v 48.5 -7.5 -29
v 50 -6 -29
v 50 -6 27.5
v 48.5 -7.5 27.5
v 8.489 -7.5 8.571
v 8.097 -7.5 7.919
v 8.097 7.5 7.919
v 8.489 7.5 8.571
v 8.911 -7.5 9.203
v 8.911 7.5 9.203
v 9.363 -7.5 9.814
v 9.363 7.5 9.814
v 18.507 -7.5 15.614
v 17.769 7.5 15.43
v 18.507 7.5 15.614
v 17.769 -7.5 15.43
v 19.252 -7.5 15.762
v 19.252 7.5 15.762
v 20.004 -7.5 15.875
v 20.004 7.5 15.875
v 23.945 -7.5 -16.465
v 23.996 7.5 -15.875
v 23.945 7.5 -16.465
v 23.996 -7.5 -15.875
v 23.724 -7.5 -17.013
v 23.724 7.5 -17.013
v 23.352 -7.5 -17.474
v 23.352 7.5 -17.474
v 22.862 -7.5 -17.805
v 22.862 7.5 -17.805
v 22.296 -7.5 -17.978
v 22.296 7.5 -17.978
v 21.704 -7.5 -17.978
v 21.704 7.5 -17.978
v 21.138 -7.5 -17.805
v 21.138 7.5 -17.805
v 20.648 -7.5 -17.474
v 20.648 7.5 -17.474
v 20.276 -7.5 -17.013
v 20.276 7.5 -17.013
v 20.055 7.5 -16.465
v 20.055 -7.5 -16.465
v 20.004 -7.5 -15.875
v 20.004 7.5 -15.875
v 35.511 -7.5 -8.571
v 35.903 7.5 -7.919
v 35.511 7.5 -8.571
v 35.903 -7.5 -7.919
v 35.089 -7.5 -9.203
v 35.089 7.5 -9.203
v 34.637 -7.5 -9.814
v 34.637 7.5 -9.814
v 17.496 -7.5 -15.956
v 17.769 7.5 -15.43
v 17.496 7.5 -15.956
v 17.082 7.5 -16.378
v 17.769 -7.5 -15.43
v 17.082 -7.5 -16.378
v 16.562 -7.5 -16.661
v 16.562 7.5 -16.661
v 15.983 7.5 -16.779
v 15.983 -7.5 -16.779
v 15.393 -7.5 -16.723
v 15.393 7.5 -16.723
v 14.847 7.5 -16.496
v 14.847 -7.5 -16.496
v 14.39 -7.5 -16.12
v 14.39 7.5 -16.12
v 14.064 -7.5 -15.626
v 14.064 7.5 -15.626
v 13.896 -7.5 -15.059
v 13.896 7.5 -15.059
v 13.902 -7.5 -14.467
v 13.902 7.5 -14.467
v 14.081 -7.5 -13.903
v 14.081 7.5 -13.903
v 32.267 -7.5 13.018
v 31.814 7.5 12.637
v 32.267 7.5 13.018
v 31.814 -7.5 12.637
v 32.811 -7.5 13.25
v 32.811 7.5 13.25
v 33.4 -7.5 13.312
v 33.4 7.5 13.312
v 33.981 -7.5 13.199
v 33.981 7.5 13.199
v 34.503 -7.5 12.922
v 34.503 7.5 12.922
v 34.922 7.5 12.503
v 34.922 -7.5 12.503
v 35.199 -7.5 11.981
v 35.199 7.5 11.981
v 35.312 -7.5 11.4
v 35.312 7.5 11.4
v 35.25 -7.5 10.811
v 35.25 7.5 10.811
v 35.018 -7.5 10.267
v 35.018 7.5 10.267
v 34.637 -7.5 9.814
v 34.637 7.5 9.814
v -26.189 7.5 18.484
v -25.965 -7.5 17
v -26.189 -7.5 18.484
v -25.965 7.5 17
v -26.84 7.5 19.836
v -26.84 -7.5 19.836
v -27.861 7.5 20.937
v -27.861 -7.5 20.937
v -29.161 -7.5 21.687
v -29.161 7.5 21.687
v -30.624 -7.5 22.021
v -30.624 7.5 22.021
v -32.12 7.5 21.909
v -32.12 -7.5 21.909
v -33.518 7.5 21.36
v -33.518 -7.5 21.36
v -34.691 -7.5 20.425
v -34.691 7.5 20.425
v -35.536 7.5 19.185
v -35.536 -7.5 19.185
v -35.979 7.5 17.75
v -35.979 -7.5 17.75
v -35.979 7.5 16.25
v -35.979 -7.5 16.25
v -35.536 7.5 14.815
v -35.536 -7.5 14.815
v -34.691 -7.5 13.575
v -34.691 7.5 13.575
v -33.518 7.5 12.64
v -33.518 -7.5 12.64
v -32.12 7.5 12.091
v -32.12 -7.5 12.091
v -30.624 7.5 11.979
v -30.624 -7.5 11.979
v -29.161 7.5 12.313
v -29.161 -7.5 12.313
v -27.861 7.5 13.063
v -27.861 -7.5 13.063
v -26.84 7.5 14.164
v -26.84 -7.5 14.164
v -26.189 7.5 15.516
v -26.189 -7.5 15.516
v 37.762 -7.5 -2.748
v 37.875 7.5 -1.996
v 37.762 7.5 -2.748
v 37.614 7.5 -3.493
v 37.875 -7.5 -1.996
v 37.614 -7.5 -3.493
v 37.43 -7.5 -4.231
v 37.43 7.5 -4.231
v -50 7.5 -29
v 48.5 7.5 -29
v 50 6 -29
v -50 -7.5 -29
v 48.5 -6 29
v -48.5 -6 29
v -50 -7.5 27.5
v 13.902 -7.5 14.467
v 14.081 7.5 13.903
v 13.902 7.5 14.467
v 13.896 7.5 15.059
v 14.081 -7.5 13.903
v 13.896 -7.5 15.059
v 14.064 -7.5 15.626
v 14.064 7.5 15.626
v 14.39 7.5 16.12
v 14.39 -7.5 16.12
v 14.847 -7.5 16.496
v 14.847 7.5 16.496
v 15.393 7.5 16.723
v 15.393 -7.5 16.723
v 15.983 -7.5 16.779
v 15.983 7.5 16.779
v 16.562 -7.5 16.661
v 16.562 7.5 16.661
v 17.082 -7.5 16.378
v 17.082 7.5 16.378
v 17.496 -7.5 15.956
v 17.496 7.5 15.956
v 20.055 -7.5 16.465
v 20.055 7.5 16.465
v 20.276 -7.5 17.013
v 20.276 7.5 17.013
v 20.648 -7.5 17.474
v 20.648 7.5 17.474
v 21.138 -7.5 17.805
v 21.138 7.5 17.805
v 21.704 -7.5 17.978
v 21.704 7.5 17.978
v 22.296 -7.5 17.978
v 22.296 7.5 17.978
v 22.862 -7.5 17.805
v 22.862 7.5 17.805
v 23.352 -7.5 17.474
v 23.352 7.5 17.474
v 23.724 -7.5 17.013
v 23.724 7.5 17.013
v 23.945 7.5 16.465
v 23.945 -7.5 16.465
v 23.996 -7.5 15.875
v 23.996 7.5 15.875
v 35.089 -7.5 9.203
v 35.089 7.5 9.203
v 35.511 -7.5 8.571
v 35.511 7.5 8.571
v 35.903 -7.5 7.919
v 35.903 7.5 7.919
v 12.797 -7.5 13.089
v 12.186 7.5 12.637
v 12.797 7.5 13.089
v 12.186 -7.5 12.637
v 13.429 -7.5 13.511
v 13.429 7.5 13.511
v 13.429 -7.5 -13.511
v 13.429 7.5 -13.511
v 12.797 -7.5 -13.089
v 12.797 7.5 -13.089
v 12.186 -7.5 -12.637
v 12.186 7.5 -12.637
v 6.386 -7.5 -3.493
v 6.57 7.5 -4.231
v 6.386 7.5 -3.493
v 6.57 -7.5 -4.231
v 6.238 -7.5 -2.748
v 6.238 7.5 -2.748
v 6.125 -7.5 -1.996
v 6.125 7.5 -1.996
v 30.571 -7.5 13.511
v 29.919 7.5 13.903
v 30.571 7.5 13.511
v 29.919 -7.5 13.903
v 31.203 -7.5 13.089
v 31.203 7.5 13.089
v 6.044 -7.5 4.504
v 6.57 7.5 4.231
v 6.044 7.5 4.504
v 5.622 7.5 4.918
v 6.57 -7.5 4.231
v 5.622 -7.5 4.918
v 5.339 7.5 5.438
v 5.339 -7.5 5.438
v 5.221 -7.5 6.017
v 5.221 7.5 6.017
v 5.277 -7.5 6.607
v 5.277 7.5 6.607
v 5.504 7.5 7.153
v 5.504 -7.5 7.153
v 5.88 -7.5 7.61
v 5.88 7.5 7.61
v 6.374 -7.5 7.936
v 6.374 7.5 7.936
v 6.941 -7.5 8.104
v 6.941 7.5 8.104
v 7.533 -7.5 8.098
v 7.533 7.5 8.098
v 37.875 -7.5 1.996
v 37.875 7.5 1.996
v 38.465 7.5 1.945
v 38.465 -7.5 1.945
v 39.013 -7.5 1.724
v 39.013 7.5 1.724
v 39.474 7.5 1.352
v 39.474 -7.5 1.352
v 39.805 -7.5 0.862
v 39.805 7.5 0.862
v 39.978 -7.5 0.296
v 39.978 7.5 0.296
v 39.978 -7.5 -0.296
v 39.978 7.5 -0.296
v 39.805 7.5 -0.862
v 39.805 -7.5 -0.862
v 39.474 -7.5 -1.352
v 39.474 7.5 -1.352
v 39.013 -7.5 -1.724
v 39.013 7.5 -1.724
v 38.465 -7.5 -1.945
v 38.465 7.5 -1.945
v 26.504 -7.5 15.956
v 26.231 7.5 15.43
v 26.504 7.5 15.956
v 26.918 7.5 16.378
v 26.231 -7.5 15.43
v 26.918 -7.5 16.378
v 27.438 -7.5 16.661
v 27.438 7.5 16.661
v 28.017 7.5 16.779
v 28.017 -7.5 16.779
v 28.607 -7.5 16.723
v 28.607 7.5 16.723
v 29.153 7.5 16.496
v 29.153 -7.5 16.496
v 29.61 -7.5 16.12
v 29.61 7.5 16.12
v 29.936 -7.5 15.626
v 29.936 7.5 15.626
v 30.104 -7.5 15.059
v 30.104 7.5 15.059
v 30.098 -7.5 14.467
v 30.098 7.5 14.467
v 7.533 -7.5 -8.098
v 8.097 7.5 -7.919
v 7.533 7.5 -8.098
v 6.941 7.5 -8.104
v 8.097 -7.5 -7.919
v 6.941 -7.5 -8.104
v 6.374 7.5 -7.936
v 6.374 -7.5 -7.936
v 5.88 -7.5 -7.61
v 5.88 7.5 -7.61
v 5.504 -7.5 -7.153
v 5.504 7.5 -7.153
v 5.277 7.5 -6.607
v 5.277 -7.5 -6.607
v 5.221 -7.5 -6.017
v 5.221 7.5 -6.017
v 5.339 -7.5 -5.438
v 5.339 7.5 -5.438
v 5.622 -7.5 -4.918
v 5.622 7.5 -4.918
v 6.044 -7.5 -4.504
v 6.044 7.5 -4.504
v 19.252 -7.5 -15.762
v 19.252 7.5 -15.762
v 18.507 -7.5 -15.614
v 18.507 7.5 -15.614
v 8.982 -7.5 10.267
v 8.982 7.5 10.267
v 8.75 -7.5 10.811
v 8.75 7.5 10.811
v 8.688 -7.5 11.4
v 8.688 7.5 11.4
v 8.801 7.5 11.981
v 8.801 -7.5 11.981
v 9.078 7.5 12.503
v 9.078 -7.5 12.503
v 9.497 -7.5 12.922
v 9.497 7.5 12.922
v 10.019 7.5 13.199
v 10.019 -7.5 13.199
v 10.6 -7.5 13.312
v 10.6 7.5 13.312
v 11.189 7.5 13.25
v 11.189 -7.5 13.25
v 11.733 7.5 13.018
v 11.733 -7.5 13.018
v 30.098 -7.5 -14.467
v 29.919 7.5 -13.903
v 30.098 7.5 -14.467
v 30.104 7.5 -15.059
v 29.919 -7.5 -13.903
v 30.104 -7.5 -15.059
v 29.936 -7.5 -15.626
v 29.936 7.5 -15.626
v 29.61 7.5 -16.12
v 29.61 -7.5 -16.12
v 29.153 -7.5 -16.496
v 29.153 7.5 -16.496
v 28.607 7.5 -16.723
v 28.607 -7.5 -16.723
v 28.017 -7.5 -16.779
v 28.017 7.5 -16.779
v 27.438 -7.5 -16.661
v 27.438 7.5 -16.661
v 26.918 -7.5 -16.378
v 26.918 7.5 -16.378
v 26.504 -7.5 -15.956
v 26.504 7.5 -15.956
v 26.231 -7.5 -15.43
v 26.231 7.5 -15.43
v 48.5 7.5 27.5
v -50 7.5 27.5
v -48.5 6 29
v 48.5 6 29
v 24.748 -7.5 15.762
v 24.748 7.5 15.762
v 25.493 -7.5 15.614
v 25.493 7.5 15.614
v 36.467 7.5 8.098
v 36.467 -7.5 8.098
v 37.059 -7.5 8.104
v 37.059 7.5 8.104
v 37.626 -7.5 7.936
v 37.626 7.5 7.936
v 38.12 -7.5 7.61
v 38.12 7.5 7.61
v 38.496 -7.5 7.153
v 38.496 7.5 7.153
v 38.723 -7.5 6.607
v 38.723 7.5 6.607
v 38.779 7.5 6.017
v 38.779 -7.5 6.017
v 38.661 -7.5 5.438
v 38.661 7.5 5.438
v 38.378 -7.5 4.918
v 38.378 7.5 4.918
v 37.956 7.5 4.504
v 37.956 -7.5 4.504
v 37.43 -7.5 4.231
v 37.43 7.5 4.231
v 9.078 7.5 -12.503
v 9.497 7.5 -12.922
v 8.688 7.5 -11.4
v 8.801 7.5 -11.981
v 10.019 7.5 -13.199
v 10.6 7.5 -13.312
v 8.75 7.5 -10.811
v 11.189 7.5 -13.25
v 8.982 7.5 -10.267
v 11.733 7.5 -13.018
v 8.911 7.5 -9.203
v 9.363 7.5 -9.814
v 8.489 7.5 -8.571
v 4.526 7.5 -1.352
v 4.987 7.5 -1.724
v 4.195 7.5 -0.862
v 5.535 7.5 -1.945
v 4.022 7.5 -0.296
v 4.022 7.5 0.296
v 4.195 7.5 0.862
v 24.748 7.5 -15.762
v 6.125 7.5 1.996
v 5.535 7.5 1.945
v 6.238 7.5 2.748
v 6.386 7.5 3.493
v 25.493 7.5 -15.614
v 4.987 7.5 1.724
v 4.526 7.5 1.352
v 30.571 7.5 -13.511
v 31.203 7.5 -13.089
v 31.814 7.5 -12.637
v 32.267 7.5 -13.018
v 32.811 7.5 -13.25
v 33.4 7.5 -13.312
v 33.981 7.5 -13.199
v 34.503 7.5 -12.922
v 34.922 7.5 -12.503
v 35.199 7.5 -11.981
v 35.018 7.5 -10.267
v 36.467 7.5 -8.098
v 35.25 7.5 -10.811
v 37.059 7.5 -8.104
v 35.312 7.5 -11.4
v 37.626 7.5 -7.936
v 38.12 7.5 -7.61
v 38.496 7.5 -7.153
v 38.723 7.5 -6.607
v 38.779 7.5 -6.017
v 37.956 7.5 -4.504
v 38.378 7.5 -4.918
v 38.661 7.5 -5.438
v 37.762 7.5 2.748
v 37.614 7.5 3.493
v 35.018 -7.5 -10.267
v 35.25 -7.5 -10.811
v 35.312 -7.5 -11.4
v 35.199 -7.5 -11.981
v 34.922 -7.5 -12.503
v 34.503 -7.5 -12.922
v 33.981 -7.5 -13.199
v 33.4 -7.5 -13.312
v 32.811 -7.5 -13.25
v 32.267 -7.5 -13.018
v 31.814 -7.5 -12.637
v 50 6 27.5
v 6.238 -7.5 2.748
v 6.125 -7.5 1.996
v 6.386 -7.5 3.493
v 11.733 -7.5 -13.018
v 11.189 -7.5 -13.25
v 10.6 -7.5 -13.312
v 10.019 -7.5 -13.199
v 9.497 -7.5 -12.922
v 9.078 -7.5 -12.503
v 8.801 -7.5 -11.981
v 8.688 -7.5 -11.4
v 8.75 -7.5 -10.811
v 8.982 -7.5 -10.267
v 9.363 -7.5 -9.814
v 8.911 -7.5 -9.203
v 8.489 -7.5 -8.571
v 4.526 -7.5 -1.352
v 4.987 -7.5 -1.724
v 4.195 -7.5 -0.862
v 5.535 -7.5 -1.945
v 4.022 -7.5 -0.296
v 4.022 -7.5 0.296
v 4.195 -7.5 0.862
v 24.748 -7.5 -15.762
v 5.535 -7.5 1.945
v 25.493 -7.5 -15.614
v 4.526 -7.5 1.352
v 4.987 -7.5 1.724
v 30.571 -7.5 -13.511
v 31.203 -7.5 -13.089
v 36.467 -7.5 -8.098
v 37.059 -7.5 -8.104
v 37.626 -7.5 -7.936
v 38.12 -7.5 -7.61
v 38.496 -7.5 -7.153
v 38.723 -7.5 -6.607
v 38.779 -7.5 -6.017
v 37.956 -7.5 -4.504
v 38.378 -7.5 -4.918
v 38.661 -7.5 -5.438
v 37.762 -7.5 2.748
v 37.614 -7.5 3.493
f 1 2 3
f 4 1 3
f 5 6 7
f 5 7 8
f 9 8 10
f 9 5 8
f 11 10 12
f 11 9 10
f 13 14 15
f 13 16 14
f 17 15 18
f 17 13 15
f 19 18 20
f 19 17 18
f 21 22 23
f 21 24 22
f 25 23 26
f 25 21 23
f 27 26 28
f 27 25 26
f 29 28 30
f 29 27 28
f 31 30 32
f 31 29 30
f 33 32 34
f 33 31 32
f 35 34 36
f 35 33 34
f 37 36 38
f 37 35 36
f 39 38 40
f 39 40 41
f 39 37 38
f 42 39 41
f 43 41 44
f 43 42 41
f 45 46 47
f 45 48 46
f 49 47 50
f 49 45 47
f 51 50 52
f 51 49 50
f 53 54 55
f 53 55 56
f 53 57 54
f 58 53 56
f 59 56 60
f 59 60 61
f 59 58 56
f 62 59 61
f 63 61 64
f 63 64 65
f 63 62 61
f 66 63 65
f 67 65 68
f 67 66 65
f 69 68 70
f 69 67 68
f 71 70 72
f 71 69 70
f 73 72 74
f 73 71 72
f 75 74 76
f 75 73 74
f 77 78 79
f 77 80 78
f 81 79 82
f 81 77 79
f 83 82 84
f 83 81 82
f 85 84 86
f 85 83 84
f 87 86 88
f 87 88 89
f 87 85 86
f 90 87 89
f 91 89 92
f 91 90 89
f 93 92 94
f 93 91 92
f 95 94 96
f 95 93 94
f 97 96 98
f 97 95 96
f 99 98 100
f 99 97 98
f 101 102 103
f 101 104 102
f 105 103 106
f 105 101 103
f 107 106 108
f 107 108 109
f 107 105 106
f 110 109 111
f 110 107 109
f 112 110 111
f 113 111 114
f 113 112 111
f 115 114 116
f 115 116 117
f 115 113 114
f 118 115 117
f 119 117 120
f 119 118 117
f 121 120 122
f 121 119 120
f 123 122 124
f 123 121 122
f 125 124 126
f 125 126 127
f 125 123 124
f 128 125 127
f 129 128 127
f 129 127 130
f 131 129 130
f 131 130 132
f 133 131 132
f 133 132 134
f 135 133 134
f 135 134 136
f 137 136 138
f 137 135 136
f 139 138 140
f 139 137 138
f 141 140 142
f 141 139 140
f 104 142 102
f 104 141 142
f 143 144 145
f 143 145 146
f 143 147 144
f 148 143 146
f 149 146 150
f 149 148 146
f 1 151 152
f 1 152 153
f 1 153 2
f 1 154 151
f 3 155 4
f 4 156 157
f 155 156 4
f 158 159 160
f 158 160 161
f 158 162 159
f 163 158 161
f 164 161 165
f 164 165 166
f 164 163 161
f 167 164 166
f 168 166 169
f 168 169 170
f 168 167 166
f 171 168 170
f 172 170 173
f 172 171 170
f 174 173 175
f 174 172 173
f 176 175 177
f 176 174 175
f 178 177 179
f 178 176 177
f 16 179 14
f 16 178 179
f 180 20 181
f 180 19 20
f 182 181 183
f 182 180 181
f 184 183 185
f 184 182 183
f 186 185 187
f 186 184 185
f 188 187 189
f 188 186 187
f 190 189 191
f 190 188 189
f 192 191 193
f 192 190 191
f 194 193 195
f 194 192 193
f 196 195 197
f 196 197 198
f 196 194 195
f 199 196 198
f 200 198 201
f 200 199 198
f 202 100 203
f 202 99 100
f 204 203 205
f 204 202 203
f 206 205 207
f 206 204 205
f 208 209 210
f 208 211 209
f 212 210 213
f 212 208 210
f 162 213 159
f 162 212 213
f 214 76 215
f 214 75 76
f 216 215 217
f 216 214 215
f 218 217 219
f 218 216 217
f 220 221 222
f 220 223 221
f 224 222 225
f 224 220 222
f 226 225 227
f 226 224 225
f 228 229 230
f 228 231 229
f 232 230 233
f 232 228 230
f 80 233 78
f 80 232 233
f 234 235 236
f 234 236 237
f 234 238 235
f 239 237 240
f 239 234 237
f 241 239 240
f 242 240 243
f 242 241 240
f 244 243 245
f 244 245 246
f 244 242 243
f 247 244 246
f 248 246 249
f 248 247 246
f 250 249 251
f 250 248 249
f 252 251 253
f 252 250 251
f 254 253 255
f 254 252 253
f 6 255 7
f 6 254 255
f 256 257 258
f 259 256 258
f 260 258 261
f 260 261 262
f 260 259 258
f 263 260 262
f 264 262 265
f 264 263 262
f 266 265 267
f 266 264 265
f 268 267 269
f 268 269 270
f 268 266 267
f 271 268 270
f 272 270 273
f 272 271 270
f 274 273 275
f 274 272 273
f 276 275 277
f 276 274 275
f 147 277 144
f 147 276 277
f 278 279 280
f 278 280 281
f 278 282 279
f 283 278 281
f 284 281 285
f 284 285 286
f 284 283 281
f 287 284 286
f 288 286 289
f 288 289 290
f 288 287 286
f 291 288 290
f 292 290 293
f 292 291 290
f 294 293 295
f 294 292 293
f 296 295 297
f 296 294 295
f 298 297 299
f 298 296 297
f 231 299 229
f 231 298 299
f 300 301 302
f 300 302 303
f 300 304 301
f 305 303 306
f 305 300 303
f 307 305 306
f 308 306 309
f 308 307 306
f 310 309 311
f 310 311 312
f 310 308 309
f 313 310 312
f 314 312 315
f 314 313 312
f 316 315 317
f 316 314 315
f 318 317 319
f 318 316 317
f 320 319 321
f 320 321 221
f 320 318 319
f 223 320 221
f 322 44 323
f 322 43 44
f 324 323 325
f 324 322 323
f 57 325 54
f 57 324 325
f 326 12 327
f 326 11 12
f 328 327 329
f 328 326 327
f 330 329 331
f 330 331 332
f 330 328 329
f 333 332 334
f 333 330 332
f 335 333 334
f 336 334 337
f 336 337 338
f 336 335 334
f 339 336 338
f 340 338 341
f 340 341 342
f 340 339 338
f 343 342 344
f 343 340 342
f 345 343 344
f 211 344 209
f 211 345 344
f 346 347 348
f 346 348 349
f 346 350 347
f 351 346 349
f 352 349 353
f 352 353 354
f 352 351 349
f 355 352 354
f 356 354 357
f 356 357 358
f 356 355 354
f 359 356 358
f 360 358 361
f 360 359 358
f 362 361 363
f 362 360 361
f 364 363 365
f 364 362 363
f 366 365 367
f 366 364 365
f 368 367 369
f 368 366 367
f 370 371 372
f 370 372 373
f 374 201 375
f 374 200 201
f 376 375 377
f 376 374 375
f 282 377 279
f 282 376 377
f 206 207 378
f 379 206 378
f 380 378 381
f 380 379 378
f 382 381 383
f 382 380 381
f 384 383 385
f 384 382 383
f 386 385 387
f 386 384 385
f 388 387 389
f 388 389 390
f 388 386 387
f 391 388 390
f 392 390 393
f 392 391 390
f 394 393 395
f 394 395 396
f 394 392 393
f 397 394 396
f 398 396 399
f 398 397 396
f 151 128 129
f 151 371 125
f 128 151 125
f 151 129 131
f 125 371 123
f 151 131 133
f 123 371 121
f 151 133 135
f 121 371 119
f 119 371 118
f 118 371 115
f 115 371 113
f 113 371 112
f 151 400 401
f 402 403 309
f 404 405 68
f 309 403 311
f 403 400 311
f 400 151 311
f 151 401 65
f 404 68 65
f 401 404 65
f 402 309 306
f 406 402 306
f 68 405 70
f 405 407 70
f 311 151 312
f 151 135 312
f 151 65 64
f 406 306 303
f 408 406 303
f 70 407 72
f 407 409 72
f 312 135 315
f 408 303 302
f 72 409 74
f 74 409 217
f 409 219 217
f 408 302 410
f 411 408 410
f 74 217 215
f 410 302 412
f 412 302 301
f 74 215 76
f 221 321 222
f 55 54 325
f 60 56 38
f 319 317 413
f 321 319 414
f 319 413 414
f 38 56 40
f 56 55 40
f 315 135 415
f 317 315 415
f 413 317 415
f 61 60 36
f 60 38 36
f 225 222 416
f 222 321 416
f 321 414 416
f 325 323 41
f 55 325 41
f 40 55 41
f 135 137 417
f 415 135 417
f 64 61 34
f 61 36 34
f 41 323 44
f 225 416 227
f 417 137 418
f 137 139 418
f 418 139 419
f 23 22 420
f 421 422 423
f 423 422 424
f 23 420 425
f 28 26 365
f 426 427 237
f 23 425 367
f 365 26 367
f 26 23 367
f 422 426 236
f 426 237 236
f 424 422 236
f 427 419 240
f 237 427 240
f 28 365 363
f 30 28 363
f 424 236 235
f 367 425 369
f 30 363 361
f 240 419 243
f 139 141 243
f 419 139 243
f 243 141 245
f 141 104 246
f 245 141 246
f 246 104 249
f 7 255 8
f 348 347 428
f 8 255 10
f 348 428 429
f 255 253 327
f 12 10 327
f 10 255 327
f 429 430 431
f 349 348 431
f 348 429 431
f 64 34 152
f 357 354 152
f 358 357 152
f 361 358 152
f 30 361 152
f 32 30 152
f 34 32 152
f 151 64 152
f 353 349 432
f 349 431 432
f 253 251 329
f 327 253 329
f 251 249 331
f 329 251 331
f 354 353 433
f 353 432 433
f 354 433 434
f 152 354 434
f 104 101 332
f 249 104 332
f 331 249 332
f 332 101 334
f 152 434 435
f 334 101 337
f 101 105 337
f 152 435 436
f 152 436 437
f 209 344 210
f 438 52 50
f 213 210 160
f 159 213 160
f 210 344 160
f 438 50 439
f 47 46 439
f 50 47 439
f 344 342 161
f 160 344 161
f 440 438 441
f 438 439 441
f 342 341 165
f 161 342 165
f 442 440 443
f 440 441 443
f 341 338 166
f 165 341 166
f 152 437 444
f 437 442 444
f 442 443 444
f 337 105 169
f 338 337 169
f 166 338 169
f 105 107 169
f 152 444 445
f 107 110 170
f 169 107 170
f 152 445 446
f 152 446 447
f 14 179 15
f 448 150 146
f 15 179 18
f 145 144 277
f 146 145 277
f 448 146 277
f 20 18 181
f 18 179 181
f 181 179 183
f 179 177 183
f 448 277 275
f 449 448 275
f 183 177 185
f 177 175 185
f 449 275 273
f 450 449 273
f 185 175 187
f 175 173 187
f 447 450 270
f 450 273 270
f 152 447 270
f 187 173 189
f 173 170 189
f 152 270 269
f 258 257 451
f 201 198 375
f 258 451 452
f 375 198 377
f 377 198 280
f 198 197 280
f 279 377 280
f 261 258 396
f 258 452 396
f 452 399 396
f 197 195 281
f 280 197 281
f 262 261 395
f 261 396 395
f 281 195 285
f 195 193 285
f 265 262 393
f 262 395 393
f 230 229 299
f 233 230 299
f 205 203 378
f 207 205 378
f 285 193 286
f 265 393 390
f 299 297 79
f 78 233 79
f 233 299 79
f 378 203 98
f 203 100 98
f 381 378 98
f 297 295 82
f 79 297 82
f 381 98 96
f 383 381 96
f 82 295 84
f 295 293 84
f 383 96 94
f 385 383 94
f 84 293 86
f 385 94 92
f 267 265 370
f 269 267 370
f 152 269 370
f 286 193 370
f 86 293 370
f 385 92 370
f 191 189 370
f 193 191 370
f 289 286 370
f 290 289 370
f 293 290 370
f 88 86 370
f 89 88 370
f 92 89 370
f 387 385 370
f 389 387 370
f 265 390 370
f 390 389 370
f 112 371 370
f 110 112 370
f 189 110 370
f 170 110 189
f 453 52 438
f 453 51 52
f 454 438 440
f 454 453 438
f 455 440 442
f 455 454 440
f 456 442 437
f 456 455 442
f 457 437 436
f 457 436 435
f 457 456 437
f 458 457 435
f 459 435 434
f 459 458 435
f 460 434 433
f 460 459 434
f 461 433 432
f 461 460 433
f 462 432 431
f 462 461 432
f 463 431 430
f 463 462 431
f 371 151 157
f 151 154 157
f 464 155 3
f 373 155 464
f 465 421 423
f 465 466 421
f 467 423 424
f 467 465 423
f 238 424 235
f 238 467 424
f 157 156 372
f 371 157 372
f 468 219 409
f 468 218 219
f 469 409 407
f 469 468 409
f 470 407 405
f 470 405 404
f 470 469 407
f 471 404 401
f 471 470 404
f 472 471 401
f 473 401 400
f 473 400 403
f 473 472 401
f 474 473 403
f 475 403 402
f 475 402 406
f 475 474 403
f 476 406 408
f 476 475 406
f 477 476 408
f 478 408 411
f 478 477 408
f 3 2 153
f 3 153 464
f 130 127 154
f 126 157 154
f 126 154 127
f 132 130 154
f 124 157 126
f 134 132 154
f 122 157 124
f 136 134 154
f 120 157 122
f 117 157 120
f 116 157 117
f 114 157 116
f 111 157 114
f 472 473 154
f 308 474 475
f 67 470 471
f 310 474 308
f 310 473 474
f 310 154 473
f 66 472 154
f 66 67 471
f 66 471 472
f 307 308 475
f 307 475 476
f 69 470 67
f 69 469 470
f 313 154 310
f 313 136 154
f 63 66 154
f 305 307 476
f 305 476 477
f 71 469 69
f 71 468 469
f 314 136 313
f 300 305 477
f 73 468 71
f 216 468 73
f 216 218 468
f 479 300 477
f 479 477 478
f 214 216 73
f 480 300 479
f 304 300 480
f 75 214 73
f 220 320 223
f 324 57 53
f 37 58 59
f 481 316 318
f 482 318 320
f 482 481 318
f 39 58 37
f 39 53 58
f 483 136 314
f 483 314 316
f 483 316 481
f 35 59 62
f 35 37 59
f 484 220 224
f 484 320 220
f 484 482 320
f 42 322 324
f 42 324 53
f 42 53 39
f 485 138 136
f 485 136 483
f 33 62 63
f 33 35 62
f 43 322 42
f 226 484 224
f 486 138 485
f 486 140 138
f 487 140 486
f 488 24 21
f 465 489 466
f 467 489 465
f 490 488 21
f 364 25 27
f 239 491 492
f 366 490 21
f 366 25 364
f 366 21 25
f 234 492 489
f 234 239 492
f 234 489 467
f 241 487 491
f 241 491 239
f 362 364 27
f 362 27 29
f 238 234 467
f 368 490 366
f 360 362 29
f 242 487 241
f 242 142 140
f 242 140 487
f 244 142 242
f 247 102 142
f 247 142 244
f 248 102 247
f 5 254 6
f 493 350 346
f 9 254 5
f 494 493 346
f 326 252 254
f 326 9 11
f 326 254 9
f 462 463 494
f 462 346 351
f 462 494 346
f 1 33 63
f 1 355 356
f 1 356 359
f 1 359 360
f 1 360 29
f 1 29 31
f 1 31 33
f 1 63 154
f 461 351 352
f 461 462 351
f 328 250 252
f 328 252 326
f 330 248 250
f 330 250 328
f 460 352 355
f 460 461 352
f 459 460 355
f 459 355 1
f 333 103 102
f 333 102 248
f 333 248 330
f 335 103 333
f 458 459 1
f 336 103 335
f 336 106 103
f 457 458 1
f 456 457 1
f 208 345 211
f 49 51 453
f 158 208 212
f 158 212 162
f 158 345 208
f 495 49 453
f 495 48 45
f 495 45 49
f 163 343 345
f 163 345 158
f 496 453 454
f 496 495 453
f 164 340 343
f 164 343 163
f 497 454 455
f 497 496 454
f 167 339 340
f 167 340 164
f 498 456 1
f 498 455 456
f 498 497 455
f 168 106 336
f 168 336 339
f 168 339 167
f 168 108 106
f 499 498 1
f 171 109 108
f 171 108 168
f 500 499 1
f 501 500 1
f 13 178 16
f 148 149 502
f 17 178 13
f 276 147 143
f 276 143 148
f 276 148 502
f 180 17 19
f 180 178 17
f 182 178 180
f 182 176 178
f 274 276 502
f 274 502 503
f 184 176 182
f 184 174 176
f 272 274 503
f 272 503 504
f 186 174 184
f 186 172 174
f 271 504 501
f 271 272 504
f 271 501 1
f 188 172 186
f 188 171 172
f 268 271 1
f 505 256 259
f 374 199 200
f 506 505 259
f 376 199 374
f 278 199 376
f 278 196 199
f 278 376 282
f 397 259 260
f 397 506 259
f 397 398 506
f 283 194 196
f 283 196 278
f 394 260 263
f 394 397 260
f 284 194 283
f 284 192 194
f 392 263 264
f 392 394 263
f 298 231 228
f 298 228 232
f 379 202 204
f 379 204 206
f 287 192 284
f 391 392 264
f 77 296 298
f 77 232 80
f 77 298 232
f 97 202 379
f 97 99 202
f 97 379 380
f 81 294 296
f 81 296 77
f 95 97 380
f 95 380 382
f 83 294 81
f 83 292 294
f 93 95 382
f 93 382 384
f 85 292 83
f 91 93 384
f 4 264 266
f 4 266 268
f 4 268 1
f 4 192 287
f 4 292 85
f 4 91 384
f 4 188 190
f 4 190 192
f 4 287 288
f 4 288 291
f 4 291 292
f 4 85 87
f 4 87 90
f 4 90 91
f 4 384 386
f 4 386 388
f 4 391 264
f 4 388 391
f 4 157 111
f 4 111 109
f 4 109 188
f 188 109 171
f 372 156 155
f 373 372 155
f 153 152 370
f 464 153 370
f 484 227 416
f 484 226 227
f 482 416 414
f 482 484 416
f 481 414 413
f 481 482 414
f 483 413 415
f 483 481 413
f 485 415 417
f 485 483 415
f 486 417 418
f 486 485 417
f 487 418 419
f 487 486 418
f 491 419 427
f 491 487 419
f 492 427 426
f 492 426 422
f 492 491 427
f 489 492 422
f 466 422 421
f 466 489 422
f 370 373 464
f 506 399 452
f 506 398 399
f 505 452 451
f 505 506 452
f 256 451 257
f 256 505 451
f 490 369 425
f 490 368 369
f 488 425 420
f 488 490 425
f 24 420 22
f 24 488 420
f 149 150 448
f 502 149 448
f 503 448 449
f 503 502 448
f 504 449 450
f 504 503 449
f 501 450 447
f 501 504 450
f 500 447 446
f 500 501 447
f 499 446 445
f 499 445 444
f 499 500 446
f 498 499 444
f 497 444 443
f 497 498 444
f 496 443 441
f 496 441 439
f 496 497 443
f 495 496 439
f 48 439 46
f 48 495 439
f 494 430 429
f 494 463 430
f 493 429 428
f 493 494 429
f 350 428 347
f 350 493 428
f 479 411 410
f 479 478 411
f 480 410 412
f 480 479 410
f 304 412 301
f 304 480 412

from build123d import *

# Parameters (mm, degrees)
F0_W     = 100
F0_H     = 58
F0_R     = 5.035
F1_DEPTH = 7.5
F2_SIZE  = 1.5


with BuildPart() as f1:
    # F0 (on Front) → F1 (new body, symmetric)
    with BuildSketch(Plane.XZ):
        Rectangle(F0_W, F0_H)
        with Locations((-31, 17)):
            Circle(F0_R, mode=Mode.SUBTRACT)
        with BuildLine():
            ThreePointArc((8.0972829663, 7.9192461182), (8.6964862032, 8.8891237283), (9.3632311248, 9.8138714275))
            ThreePointArc((9.3632311248, 9.8138714275), (9.2720779386, 12.7279220614), (12.1861285725, 12.6367688752))
            ThreePointArc((12.1861285725, 12.6367688752), (13.1108762717, 13.3035137968), (14.0807538818, 13.9027170337))
            ThreePointArc((14.0807538818, 13.9027170337), (15.1116982174, 16.6298315852), (17.7690471406, 15.4304581235))
            ThreePointArc((17.7690471406, 15.4304581235), (18.8785548477, 15.6925644865), (20.0039100722, 15.875))
            ThreePointArc((20.0039100722, 15.875), (22, 18), (23.9960899278, 15.875))
            ThreePointArc((23.9960899278, 15.875), (25.1214451523, 15.6925644865), (26.2309528594, 15.4304581235))
            ThreePointArc((26.2309528594, 15.4304581235), (28.8883017826, 16.6298315852), (29.9192461182, 13.9027170337))
            ThreePointArc((29.9192461182, 13.9027170337), (30.8891237283, 13.3035137968), (31.8138714275, 12.6367688752))
            ThreePointArc((31.8138714275, 12.6367688752), (34.7279220614, 12.7279220614), (34.6367688752, 9.8138714275))
            ThreePointArc((34.6367688752, 9.8138714275), (35.3035137968, 8.8891237283), (35.9027170337, 7.9192461182))
            ThreePointArc((35.9027170337, 7.9192461182), (38.6298315852, 6.8883017826), (37.4304581235, 4.2309528594))
            ThreePointArc((37.4304581235, 4.2309528594), (37.6925644865, 3.1214451523), (37.875, 1.9960899278))
            ThreePointArc((37.875, 1.9960899278), (40, 0), (37.875, -1.9960899278))
            ThreePointArc((37.875, -1.9960899278), (37.6925644865, -3.1214451523), (37.4304581235, -4.2309528594))
            ThreePointArc((37.4304581235, -4.2309528594), (38.6298315852, -6.8883017826), (35.9027170337, -7.9192461182))
            ThreePointArc((35.9027170337, -7.9192461182), (35.3035137968, -8.8891237283), (34.6367688752, -9.8138714275))
            ThreePointArc((34.6367688752, -9.8138714275), (34.7279220614, -12.7279220614), (31.8138714275, -12.6367688752))
            ThreePointArc((31.8138714275, -12.6367688752), (30.8891237283, -13.3035137968), (29.9192461182, -13.9027170337))
            ThreePointArc((29.9192461182, -13.9027170337), (28.8883017826, -16.6298315852), (26.2309528594, -15.4304581235))
            ThreePointArc((26.2309528594, -15.4304581235), (25.1214451523, -15.6925644865), (23.9960899278, -15.875))
            ThreePointArc((23.9960899278, -15.875), (22, -18), (20.0039100722, -15.875))
            ThreePointArc((20.0039100722, -15.875), (18.8785548477, -15.6925644865), (17.7690471406, -15.4304581235))
            ThreePointArc((17.7690471406, -15.4304581235), (15.1116982174, -16.6298315852), (14.0807538818, -13.9027170337))
            ThreePointArc((14.0807538818, -13.9027170337), (13.1108762717, -13.3035137968), (12.1861285725, -12.6367688752))
            ThreePointArc((12.1861285725, -12.6367688752), (9.2720779386, -12.7279220614), (9.3632311248, -9.8138714275))
            ThreePointArc((9.3632311248, -9.8138714275), (8.6964862032, -8.8891237283), (8.0972829663, -7.9192461182))
            ThreePointArc((8.0972829663, -7.9192461182), (5.3701684148, -6.8883017826), (6.5695418765, -4.2309528594))
            ThreePointArc((6.5695418765, -4.2309528594), (6.3074355135, -3.1214451523), (6.125, -1.9960899278))
            ThreePointArc((6.125, -1.9960899278), (4, 0), (6.125, 1.9960899278))
            ThreePointArc((6.125, 1.9960899278), (6.3074355135, 3.1214451523), (6.5695418765, 4.2309528594))
            ThreePointArc((6.5695418765, 4.2309528594), (5.3701684148, 6.8883017826), (8.0972829663, 7.9192461182))
        make_face(mode=Mode.SUBTRACT)
    extrude(amount=F1_DEPTH, both=True)

    # F2
    f2_edges = [f1.edges().sort_by_distance(p)[0] for p in [
        (50, 0, 29),
        (0, 7.5, 29),
        (0, -7.5, 29),
        (50, -7.5, 0),
        (50, 7.5, 0),
        (-50, 0, 29),
    ]]
    chamfer(f2_edges, length=F2_SIZE)


solid = f1.part
